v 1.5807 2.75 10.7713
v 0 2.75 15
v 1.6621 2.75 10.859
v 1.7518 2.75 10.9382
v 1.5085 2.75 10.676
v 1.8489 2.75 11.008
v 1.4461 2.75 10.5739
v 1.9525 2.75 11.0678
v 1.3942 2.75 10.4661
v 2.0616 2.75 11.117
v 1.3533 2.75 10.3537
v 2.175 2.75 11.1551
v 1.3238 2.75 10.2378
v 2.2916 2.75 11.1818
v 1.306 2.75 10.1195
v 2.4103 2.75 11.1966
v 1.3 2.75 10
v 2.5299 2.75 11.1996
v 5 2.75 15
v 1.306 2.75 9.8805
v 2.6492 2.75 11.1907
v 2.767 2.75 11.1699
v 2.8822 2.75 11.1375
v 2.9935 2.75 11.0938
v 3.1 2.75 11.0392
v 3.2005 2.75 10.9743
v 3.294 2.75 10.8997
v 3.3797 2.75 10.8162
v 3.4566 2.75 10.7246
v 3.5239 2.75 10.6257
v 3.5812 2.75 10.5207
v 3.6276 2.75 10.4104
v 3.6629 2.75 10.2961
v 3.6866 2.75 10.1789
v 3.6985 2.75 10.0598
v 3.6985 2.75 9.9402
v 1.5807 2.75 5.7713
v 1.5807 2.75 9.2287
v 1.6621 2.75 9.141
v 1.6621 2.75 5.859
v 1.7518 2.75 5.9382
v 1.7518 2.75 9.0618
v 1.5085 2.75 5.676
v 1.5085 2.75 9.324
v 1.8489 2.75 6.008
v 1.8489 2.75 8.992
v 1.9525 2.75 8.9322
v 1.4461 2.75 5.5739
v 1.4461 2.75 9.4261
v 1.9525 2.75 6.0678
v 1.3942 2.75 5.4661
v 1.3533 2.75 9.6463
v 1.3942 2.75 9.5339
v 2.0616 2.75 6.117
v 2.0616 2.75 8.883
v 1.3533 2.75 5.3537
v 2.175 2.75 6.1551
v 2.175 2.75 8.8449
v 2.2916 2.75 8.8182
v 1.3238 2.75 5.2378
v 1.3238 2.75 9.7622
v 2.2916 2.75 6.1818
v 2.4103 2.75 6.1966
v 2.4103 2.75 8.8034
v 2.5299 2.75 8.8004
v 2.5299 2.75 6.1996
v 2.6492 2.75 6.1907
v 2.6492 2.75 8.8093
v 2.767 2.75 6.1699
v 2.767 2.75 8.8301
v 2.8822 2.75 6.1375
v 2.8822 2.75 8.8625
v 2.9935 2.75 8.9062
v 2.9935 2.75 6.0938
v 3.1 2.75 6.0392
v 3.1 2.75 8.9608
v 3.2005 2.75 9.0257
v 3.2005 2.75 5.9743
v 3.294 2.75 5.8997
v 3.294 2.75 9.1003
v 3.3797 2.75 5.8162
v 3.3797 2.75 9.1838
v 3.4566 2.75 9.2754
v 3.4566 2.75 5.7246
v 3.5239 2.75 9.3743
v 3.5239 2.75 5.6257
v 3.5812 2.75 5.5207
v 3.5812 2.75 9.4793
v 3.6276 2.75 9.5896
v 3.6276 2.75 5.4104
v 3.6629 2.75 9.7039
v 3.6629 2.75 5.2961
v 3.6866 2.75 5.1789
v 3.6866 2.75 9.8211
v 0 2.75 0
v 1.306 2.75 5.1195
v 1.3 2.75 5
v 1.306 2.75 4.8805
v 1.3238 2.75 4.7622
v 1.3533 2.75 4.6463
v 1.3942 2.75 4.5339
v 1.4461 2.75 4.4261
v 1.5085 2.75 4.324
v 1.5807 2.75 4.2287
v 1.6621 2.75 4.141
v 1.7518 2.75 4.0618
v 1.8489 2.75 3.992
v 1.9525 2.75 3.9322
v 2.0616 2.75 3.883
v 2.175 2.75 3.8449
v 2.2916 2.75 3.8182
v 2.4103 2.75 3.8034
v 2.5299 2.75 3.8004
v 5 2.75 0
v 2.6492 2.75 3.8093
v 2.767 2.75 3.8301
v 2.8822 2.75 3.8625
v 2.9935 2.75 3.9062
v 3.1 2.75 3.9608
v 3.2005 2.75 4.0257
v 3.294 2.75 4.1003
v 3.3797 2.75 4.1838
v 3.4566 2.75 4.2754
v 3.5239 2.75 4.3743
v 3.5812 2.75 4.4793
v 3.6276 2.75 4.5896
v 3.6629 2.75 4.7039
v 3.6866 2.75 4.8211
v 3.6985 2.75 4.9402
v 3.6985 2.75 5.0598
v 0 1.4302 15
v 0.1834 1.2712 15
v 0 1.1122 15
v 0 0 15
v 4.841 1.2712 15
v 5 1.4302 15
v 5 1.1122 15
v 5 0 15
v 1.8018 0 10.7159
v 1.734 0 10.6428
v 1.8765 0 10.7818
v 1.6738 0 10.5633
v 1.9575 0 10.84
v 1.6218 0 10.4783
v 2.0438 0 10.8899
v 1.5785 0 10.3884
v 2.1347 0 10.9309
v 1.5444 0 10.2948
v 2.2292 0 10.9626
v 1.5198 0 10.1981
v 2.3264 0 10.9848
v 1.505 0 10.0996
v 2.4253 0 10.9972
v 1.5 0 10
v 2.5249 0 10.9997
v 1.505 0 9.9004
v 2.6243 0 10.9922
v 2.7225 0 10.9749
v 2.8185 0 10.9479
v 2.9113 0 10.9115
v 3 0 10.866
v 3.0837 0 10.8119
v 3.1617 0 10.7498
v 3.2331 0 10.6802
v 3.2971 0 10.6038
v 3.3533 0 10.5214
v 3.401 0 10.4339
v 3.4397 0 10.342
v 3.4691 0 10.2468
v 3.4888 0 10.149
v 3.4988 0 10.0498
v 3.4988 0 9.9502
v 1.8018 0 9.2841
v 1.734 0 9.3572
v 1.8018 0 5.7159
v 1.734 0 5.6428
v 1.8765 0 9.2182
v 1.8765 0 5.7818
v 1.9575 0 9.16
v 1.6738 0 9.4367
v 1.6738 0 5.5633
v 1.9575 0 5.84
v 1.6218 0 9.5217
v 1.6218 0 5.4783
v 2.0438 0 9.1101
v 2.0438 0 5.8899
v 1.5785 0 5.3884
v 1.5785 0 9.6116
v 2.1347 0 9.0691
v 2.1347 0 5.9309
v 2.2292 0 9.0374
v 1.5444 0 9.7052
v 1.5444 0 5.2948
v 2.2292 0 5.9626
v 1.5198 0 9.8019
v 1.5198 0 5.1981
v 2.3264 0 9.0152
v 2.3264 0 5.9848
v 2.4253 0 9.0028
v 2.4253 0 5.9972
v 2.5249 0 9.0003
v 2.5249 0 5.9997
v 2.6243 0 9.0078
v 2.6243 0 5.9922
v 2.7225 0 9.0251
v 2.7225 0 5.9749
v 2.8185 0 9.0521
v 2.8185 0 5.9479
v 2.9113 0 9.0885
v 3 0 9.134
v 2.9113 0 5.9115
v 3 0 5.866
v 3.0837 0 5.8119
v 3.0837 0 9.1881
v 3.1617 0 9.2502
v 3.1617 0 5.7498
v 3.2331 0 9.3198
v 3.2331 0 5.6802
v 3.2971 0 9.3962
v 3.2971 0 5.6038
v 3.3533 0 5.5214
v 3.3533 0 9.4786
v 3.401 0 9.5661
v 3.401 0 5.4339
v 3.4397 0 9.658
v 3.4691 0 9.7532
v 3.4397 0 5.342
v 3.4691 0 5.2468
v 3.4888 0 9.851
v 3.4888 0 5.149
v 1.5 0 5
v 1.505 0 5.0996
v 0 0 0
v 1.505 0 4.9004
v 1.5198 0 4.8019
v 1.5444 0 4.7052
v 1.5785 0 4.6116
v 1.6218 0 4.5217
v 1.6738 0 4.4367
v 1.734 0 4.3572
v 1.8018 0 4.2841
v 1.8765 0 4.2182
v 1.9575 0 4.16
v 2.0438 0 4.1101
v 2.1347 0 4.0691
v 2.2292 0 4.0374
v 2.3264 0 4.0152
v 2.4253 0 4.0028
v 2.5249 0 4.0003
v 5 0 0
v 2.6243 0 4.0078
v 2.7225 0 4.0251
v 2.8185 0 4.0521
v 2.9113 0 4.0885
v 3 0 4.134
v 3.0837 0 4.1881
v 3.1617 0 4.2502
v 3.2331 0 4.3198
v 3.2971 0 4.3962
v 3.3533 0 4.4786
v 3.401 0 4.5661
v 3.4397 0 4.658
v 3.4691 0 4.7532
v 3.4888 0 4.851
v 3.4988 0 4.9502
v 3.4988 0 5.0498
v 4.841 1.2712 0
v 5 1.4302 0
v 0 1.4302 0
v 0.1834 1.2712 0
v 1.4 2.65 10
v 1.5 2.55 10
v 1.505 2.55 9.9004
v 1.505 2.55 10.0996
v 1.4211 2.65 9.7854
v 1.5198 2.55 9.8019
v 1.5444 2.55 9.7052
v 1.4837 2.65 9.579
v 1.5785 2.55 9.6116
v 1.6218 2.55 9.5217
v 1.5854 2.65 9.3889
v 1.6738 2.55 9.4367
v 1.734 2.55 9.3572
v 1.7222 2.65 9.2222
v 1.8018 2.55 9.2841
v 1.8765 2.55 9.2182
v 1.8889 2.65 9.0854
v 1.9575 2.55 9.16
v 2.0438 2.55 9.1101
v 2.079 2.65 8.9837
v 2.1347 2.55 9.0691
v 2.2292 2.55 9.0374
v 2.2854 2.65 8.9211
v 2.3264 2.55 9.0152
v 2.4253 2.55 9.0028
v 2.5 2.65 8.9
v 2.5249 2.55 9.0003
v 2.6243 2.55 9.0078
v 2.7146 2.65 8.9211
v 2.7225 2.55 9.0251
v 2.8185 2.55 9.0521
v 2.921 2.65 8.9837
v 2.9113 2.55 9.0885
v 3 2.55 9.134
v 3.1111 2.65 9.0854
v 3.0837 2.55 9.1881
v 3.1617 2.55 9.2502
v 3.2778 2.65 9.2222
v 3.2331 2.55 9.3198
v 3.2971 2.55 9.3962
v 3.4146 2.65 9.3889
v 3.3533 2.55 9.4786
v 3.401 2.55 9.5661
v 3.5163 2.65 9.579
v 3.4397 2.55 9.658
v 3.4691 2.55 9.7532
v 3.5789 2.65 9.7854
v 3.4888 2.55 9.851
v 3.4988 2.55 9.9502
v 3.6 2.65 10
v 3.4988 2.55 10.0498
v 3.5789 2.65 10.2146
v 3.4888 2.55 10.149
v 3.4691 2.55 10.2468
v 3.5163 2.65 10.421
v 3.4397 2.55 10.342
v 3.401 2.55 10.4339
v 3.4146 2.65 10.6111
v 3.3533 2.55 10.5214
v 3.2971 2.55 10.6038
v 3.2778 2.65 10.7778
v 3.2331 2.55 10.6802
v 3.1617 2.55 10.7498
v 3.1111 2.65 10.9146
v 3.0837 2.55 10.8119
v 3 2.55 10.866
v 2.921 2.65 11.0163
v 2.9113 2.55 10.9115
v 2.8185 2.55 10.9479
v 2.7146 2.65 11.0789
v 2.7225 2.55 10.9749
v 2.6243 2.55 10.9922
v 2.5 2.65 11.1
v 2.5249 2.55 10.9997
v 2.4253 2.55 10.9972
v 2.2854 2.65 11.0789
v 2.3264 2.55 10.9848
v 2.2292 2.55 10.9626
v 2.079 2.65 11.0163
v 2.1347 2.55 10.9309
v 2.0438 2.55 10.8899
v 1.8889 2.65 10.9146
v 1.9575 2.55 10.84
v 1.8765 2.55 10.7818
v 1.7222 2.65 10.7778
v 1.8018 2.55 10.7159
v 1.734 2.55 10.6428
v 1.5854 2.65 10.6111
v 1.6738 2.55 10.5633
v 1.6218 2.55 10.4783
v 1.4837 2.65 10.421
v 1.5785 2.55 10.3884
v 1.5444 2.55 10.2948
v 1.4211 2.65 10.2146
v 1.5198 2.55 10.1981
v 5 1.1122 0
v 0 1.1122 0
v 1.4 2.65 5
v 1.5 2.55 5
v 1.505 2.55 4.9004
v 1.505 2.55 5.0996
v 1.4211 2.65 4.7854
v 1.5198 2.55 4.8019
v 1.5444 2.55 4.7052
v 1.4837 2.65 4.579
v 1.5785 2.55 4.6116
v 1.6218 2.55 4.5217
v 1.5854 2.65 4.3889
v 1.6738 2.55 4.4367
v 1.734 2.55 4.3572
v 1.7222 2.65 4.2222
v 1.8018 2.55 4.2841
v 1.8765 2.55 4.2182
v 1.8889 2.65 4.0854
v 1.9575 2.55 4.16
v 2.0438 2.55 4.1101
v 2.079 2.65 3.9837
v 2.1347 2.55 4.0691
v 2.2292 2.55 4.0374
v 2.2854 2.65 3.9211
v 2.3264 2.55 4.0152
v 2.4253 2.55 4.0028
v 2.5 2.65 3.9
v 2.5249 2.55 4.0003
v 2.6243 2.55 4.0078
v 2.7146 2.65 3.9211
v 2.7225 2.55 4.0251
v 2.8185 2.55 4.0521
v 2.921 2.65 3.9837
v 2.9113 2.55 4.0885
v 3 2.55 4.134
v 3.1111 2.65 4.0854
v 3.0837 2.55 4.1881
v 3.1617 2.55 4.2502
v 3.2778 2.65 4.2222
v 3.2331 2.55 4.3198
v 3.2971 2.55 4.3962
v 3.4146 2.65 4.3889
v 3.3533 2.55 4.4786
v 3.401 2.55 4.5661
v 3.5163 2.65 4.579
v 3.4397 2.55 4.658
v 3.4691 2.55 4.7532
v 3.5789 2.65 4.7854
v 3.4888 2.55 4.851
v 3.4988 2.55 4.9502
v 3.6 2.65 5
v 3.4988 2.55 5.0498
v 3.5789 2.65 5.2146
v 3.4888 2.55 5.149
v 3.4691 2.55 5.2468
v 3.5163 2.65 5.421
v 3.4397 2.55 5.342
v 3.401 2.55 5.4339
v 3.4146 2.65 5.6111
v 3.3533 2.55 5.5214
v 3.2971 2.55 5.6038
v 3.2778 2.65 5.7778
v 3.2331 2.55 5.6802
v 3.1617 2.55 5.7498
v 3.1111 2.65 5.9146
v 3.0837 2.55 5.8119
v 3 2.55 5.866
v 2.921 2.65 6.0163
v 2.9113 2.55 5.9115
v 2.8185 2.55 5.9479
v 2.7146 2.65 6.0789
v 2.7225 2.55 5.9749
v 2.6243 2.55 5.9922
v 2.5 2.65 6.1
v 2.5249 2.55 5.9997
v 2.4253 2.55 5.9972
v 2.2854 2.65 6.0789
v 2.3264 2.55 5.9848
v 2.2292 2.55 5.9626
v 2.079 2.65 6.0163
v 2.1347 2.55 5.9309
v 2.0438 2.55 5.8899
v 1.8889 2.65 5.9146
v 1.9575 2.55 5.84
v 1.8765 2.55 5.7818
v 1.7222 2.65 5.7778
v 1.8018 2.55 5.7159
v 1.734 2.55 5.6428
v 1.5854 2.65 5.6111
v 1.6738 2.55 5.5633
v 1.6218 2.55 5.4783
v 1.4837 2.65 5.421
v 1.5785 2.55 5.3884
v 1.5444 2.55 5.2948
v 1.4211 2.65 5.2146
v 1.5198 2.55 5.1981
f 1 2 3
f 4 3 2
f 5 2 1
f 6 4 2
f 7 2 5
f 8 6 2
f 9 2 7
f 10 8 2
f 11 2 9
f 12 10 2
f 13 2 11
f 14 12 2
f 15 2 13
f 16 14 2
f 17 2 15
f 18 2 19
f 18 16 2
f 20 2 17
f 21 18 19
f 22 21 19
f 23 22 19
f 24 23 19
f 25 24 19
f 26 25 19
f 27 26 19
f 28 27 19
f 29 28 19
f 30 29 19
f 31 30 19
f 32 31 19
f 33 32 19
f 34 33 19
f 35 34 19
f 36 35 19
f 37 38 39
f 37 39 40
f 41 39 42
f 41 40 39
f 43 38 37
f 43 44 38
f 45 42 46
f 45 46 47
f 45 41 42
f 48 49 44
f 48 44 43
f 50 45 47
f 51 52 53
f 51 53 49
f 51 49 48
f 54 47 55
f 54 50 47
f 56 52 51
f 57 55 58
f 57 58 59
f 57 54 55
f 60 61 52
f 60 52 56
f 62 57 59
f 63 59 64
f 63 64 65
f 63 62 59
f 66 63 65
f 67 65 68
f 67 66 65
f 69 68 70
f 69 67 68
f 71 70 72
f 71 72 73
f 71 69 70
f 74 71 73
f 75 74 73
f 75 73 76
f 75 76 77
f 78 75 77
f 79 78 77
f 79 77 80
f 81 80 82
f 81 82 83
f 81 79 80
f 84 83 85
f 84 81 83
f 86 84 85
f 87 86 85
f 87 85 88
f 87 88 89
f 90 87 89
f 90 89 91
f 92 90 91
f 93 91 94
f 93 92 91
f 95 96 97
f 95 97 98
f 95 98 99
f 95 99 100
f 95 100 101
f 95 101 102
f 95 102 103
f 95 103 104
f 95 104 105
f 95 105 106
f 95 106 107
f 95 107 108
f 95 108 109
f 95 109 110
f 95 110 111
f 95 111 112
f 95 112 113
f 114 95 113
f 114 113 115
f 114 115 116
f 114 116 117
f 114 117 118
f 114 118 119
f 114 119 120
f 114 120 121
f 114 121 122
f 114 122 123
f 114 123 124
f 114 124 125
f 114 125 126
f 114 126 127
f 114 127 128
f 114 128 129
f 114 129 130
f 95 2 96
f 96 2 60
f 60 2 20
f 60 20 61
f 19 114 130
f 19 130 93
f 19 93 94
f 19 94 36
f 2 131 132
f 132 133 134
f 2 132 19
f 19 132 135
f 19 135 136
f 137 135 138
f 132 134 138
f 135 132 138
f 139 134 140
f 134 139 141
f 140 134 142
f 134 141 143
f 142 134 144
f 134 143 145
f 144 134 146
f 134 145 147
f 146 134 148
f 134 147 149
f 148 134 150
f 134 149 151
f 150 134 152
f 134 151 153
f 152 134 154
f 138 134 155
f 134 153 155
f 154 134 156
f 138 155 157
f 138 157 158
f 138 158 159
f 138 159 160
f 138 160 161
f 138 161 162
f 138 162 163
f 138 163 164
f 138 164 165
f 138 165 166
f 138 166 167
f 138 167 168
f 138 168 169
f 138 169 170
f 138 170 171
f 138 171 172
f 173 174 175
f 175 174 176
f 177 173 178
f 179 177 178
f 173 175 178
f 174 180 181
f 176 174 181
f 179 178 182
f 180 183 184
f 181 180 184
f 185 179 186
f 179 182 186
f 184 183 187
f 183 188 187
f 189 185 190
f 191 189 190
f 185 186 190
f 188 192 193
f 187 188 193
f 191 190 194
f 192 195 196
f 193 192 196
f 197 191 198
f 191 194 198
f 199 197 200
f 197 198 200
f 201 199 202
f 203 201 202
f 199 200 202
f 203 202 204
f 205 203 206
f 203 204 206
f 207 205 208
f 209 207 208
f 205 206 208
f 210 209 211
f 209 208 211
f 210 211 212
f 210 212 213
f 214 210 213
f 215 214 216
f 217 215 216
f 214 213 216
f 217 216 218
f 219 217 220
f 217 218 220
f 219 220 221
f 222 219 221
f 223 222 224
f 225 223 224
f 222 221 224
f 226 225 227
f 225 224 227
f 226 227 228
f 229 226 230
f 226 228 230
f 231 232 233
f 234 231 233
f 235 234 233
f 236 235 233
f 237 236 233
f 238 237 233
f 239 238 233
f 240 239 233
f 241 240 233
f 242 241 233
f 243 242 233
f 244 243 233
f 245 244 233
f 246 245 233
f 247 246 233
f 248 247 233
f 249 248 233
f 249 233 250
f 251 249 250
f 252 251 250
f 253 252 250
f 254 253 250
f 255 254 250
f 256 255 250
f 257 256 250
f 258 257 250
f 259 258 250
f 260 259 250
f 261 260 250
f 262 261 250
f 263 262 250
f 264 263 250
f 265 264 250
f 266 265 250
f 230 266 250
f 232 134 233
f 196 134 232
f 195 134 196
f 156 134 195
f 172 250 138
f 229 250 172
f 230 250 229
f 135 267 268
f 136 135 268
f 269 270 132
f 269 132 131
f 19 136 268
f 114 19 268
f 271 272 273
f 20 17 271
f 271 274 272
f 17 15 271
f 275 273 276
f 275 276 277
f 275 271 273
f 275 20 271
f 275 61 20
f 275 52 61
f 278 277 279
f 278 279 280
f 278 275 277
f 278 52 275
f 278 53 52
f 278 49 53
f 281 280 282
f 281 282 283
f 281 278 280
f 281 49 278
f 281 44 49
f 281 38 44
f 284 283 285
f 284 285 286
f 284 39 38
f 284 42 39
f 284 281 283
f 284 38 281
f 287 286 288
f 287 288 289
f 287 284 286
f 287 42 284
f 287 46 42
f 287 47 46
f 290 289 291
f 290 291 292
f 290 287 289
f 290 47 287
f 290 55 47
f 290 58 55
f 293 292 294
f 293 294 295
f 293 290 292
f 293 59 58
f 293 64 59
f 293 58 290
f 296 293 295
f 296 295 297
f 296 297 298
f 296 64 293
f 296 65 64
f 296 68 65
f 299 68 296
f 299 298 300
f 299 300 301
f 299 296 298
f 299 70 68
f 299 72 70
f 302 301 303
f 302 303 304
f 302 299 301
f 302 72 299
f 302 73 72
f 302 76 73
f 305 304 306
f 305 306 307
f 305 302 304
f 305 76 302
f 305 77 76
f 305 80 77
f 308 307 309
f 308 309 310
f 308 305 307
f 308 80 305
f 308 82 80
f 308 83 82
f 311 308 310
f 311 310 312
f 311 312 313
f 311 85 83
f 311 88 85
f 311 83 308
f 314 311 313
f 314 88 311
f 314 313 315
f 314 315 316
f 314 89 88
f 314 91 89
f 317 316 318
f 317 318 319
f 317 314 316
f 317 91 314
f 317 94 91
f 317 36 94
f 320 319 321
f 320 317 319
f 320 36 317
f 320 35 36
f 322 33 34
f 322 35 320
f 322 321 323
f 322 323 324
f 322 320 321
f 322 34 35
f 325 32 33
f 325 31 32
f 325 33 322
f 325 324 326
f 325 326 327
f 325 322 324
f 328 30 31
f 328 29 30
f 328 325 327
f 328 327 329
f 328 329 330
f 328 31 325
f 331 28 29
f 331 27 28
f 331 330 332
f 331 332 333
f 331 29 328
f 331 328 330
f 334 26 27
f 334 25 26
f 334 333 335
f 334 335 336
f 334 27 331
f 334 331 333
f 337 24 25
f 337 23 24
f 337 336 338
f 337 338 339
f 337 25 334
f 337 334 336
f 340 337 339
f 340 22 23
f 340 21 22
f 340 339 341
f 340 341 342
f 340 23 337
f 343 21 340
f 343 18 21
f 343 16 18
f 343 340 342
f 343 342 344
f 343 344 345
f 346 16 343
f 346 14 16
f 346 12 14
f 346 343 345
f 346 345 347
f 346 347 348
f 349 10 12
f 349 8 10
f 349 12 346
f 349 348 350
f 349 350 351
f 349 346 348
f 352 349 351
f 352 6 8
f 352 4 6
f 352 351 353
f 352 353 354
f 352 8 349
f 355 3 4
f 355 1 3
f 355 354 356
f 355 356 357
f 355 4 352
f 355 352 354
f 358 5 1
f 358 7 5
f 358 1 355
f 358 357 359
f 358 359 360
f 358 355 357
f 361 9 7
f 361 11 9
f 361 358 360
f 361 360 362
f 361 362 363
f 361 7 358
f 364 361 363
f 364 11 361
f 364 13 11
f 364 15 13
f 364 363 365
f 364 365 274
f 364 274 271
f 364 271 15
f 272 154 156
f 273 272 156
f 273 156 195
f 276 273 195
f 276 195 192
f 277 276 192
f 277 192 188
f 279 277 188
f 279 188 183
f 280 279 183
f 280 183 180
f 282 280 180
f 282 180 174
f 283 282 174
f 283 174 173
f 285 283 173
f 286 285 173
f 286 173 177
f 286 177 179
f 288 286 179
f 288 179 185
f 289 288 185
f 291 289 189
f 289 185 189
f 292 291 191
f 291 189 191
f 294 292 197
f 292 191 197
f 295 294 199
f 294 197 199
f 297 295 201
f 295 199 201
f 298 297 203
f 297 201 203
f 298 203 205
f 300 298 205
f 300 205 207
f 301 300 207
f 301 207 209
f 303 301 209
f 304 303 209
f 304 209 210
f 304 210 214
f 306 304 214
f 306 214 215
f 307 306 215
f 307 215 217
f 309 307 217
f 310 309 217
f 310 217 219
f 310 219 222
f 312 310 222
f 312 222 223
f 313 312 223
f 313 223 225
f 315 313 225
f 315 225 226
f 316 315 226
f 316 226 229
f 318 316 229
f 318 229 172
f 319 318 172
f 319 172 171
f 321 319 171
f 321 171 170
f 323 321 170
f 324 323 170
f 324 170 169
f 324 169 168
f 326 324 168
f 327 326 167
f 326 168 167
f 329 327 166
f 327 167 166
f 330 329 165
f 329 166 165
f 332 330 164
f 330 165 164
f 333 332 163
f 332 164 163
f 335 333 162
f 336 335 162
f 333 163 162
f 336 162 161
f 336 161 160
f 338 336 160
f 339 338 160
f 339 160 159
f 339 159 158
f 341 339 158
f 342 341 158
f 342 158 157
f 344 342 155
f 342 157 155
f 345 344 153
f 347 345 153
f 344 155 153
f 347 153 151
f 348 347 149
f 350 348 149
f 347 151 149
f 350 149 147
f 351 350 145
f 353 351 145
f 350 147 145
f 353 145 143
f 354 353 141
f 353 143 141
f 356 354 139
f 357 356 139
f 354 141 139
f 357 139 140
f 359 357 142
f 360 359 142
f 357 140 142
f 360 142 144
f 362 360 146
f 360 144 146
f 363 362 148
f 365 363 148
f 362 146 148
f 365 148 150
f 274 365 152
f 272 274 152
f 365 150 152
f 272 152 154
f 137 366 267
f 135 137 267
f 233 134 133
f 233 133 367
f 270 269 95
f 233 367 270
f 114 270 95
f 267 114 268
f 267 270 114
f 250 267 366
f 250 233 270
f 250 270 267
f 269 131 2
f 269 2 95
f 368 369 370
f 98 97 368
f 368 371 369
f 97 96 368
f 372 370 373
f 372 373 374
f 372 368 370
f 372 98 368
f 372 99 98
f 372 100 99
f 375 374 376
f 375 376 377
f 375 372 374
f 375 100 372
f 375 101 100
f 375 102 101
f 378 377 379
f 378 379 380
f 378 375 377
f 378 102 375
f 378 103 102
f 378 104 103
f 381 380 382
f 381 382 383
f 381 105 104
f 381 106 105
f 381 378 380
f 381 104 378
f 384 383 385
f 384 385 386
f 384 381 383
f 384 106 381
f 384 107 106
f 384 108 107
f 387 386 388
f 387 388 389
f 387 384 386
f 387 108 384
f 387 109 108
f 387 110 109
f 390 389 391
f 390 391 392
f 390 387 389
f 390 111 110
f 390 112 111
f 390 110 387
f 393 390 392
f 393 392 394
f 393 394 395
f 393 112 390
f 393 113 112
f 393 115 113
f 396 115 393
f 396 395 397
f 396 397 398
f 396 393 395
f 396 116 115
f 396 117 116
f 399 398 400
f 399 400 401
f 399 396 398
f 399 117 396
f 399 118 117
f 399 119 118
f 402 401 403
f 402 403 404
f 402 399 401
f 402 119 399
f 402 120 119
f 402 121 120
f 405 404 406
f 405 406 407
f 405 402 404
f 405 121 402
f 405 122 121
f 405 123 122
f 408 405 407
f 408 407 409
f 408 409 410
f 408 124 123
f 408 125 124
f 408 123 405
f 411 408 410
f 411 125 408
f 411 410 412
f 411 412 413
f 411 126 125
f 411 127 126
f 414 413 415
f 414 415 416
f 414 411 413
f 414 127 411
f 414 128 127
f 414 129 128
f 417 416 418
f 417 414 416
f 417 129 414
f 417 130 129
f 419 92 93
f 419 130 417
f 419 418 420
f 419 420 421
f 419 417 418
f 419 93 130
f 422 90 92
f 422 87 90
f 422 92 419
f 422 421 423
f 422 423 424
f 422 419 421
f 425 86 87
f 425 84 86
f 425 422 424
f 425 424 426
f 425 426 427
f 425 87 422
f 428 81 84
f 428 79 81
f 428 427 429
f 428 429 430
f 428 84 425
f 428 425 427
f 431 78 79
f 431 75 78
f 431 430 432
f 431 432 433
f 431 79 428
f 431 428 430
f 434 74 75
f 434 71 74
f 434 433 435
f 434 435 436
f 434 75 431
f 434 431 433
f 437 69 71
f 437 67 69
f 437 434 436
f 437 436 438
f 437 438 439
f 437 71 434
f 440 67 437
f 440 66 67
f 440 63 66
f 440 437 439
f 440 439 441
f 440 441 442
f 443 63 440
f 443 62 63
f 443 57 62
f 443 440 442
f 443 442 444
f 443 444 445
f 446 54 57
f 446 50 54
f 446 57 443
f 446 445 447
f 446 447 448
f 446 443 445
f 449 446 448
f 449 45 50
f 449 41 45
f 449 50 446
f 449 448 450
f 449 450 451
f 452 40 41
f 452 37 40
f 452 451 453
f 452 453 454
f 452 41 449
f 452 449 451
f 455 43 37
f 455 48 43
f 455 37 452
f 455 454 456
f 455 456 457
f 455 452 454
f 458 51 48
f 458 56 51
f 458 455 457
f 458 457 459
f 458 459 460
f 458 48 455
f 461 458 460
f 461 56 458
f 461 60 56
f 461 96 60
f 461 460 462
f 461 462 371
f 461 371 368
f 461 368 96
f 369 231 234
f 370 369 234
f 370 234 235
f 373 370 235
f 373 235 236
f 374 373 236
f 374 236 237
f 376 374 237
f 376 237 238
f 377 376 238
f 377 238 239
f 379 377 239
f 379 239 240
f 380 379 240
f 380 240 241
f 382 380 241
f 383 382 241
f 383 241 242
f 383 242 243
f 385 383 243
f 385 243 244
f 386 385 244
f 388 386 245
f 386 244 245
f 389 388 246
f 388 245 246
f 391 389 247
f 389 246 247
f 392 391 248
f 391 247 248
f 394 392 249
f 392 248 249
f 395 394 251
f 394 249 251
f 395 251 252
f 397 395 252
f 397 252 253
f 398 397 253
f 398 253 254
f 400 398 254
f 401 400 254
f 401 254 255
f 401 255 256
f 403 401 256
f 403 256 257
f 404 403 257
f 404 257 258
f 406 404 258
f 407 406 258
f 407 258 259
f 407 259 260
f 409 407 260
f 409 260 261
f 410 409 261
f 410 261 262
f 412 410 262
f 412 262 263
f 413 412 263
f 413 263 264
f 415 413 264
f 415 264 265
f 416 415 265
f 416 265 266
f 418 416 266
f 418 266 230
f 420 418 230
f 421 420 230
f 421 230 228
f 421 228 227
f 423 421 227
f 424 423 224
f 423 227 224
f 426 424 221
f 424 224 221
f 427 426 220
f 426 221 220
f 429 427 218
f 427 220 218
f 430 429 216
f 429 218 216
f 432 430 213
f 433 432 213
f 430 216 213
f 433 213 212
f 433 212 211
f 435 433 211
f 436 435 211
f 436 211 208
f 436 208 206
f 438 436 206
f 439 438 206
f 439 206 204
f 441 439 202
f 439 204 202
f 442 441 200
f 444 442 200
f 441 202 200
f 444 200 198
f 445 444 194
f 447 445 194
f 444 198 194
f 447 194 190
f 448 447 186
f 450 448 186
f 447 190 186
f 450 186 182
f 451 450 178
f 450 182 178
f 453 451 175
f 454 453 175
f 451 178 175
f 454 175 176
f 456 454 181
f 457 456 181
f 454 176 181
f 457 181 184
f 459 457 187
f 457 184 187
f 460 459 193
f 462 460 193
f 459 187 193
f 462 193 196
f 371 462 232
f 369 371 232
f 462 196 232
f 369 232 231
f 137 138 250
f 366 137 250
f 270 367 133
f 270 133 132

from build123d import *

# Parameters (mm, degrees)
SKETCH_1_W          = 5
SKETCH_1_H          = 15
EXTRUDE_1_DEPTH     = 2.75
SKETCH_2_R          = 1
CUT_EXTRUDE_1_DEPTH = 3.75
CUT_EXTRUDE_2_DEPTH = 16
CHAMFER_1_SIZE      = 0.2


with BuildPart() as part:
    # 草图1 → 凸台-拉伸1 (new body)
    with BuildSketch(Plane(origin=(0, 0, 0), x_dir=(1, 0, 0), z_dir=(0, 1, 0))):
        with Locations((2.5, -7.5)):
            Rectangle(SKETCH_1_W, SKETCH_1_H)
    extrude(amount=EXTRUDE_1_DEPTH)

    # 草图2 → 切除-拉伸1 (cut, through all)
    with BuildSketch(Plane(origin=(0, 0, 0), x_dir=(-1, 0, 0), z_dir=(0, -1, 0))):
        with Locations((-2.5, -10)):
            Circle(SKETCH_2_R)
        with Locations((-2.5, -5)):
            Circle(SKETCH_2_R)
    extrude(amount=-CUT_EXTRUDE_1_DEPTH, mode=Mode.SUBTRACT)

    # 草图3 → 切除-拉伸2 (cut, through all)
    with BuildSketch(Plane(origin=(0, 0, 0), x_dir=(-1, 0, 0), z_dir=(0, 0, -1))):
        Polygon((0, 1.112237097), (-0.183390928, 1.271215949), (0, 1.430194801), align=None)
        Polygon((-5, 1.112237097), (-4.841021148, 1.271215949), (-5, 1.430194801), align=None)
    extrude(amount=-CUT_EXTRUDE_2_DEPTH, mode=Mode.SUBTRACT)

    # 倒角1
    chamfer_1_edges = [part.edges().sort_by_distance(p)[0] for p in [
        (3.5, 2.75, 10),
        (3.5, 2.75, 5),
    ]]
    chamfer(chamfer_1_edges, length=CHAMFER_1_SIZE)


solid = part.part
